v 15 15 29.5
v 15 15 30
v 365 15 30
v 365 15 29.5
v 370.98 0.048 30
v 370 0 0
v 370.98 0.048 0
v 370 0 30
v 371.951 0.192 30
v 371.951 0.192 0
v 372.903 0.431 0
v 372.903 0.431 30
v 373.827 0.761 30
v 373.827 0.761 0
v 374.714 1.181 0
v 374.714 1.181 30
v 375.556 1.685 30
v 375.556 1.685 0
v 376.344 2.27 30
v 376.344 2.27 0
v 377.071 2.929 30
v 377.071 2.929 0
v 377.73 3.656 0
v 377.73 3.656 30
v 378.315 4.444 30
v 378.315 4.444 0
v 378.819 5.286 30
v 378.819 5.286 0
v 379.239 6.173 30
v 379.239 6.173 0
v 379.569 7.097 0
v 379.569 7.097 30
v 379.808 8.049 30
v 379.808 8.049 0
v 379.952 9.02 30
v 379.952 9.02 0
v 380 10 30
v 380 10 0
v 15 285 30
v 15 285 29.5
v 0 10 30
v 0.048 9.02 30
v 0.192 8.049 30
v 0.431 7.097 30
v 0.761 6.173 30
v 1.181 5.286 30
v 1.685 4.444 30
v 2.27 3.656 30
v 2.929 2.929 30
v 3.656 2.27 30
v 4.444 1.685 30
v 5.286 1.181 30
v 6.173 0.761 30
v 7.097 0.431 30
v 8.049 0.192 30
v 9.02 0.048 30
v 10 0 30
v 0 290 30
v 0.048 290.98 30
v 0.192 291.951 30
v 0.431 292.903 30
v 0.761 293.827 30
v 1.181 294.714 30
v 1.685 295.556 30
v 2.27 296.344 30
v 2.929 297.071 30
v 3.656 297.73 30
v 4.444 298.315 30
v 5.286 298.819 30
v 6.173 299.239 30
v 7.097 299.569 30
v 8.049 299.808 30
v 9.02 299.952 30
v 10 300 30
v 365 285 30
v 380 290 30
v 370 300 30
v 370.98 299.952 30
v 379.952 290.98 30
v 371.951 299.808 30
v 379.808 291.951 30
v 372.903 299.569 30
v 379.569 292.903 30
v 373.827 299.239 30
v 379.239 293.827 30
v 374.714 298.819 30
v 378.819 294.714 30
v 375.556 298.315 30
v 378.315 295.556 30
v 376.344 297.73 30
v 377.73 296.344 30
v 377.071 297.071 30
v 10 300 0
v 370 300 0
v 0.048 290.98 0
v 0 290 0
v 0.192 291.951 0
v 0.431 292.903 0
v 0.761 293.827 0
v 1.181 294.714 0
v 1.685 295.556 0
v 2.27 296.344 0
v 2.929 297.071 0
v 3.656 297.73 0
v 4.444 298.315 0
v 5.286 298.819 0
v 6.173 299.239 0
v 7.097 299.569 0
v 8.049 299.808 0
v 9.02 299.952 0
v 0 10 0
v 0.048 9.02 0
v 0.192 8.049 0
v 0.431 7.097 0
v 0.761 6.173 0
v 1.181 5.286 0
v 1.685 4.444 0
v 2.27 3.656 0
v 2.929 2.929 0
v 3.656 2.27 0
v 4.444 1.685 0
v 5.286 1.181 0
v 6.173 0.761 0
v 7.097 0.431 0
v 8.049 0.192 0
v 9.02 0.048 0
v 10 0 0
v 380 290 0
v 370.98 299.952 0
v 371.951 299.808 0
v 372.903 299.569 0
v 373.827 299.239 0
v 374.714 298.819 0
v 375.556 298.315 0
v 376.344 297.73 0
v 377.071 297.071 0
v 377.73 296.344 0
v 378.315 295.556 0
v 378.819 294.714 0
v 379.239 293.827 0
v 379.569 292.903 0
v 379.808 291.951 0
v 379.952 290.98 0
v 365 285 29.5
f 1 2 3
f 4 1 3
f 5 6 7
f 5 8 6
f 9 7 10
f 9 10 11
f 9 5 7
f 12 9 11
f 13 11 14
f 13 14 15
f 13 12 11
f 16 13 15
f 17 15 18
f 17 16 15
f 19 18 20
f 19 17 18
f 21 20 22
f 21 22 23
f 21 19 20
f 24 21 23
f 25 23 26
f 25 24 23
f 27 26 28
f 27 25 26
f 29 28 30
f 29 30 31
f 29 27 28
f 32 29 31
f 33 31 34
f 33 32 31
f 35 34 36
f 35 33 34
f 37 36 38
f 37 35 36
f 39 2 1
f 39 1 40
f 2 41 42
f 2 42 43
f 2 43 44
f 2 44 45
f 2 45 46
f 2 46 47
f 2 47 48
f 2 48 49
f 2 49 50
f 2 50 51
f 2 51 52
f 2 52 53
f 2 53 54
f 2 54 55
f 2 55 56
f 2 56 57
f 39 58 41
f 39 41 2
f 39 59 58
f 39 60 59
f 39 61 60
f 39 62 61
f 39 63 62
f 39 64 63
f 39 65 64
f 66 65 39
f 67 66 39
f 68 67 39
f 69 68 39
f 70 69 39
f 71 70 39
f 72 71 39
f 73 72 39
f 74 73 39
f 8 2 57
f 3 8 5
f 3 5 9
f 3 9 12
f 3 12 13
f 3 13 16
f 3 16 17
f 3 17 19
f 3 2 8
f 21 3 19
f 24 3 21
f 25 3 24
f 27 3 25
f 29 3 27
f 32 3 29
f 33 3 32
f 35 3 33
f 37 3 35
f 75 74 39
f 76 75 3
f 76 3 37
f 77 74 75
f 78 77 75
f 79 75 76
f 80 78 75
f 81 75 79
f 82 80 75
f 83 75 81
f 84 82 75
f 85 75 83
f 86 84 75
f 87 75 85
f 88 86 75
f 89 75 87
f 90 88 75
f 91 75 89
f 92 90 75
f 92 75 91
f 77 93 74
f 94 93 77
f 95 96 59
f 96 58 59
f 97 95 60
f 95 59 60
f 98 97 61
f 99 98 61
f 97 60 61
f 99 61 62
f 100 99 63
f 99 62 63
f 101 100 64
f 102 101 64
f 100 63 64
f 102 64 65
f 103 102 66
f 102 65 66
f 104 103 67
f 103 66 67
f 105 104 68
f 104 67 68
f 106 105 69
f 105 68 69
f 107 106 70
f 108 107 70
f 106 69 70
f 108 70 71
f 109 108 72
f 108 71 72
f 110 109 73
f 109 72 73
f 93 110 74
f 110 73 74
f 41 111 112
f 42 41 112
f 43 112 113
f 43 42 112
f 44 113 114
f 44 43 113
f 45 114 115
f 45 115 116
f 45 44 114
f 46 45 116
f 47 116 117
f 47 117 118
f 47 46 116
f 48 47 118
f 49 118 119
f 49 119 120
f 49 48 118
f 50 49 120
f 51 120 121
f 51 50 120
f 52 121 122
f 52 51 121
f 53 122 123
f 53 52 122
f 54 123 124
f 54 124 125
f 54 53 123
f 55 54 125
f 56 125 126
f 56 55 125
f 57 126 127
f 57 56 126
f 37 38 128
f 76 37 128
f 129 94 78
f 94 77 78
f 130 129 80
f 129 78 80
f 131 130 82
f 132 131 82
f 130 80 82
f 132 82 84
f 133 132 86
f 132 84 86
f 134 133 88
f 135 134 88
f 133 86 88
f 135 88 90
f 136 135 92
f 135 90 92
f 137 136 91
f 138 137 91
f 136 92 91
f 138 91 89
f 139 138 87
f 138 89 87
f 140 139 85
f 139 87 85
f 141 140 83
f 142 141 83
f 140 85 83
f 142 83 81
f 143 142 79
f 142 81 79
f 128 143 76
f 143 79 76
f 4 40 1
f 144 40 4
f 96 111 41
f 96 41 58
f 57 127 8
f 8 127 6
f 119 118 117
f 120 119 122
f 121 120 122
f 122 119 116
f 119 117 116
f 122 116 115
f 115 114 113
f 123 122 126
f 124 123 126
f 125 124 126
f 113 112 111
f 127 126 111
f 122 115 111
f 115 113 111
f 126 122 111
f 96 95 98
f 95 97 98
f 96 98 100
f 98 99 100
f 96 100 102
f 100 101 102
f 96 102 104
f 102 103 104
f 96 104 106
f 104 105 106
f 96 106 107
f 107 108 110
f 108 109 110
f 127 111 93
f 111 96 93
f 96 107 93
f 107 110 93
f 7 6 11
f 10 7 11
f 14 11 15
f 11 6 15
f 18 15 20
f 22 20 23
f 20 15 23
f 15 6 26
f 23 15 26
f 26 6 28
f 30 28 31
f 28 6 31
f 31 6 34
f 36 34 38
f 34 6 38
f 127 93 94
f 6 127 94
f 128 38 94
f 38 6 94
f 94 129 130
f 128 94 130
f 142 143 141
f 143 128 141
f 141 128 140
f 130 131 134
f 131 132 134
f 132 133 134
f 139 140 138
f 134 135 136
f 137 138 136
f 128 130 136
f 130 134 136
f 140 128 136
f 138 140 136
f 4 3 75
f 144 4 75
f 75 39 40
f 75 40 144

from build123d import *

# Parameters (mm, degrees)
SKETCH_1_W          = 380
SKETCH_1_H          = 300
EXTRUDE_1_DEPTH     = 30
SKETCH_2_W          = 350
SKETCH_2_H          = 270
CUT_EXTRUDE_1_DEPTH = 0.5
FILLET_1_R          = 10


with BuildPart() as part:
    # 草图1 → 凸台-拉伸1 (new body)
    with BuildSketch(Plane.XY):
        with Locations((190, 150)):
            Rectangle(SKETCH_1_W, SKETCH_1_H)
    extrude(amount=EXTRUDE_1_DEPTH)

    # 草图2 → 切除-拉伸1 (cut)
    with BuildSketch(Plane.XY.offset(30)):
        with Locations((190, 150)):
            Rectangle(SKETCH_2_W, SKETCH_2_H)
    extrude(amount=-CUT_EXTRUDE_1_DEPTH, mode=Mode.SUBTRACT)

    # 圆角1
    fillet_1_edges = [part.edges().sort_by_distance(p)[0] for p in [
        (0, 300, 15),
        (380, 300, 15),
        (380, 0, 15),
        (0, 0, 15),
    ]]
    fillet(fillet_1_edges, radius=FILLET_1_R)


solid = part.part
